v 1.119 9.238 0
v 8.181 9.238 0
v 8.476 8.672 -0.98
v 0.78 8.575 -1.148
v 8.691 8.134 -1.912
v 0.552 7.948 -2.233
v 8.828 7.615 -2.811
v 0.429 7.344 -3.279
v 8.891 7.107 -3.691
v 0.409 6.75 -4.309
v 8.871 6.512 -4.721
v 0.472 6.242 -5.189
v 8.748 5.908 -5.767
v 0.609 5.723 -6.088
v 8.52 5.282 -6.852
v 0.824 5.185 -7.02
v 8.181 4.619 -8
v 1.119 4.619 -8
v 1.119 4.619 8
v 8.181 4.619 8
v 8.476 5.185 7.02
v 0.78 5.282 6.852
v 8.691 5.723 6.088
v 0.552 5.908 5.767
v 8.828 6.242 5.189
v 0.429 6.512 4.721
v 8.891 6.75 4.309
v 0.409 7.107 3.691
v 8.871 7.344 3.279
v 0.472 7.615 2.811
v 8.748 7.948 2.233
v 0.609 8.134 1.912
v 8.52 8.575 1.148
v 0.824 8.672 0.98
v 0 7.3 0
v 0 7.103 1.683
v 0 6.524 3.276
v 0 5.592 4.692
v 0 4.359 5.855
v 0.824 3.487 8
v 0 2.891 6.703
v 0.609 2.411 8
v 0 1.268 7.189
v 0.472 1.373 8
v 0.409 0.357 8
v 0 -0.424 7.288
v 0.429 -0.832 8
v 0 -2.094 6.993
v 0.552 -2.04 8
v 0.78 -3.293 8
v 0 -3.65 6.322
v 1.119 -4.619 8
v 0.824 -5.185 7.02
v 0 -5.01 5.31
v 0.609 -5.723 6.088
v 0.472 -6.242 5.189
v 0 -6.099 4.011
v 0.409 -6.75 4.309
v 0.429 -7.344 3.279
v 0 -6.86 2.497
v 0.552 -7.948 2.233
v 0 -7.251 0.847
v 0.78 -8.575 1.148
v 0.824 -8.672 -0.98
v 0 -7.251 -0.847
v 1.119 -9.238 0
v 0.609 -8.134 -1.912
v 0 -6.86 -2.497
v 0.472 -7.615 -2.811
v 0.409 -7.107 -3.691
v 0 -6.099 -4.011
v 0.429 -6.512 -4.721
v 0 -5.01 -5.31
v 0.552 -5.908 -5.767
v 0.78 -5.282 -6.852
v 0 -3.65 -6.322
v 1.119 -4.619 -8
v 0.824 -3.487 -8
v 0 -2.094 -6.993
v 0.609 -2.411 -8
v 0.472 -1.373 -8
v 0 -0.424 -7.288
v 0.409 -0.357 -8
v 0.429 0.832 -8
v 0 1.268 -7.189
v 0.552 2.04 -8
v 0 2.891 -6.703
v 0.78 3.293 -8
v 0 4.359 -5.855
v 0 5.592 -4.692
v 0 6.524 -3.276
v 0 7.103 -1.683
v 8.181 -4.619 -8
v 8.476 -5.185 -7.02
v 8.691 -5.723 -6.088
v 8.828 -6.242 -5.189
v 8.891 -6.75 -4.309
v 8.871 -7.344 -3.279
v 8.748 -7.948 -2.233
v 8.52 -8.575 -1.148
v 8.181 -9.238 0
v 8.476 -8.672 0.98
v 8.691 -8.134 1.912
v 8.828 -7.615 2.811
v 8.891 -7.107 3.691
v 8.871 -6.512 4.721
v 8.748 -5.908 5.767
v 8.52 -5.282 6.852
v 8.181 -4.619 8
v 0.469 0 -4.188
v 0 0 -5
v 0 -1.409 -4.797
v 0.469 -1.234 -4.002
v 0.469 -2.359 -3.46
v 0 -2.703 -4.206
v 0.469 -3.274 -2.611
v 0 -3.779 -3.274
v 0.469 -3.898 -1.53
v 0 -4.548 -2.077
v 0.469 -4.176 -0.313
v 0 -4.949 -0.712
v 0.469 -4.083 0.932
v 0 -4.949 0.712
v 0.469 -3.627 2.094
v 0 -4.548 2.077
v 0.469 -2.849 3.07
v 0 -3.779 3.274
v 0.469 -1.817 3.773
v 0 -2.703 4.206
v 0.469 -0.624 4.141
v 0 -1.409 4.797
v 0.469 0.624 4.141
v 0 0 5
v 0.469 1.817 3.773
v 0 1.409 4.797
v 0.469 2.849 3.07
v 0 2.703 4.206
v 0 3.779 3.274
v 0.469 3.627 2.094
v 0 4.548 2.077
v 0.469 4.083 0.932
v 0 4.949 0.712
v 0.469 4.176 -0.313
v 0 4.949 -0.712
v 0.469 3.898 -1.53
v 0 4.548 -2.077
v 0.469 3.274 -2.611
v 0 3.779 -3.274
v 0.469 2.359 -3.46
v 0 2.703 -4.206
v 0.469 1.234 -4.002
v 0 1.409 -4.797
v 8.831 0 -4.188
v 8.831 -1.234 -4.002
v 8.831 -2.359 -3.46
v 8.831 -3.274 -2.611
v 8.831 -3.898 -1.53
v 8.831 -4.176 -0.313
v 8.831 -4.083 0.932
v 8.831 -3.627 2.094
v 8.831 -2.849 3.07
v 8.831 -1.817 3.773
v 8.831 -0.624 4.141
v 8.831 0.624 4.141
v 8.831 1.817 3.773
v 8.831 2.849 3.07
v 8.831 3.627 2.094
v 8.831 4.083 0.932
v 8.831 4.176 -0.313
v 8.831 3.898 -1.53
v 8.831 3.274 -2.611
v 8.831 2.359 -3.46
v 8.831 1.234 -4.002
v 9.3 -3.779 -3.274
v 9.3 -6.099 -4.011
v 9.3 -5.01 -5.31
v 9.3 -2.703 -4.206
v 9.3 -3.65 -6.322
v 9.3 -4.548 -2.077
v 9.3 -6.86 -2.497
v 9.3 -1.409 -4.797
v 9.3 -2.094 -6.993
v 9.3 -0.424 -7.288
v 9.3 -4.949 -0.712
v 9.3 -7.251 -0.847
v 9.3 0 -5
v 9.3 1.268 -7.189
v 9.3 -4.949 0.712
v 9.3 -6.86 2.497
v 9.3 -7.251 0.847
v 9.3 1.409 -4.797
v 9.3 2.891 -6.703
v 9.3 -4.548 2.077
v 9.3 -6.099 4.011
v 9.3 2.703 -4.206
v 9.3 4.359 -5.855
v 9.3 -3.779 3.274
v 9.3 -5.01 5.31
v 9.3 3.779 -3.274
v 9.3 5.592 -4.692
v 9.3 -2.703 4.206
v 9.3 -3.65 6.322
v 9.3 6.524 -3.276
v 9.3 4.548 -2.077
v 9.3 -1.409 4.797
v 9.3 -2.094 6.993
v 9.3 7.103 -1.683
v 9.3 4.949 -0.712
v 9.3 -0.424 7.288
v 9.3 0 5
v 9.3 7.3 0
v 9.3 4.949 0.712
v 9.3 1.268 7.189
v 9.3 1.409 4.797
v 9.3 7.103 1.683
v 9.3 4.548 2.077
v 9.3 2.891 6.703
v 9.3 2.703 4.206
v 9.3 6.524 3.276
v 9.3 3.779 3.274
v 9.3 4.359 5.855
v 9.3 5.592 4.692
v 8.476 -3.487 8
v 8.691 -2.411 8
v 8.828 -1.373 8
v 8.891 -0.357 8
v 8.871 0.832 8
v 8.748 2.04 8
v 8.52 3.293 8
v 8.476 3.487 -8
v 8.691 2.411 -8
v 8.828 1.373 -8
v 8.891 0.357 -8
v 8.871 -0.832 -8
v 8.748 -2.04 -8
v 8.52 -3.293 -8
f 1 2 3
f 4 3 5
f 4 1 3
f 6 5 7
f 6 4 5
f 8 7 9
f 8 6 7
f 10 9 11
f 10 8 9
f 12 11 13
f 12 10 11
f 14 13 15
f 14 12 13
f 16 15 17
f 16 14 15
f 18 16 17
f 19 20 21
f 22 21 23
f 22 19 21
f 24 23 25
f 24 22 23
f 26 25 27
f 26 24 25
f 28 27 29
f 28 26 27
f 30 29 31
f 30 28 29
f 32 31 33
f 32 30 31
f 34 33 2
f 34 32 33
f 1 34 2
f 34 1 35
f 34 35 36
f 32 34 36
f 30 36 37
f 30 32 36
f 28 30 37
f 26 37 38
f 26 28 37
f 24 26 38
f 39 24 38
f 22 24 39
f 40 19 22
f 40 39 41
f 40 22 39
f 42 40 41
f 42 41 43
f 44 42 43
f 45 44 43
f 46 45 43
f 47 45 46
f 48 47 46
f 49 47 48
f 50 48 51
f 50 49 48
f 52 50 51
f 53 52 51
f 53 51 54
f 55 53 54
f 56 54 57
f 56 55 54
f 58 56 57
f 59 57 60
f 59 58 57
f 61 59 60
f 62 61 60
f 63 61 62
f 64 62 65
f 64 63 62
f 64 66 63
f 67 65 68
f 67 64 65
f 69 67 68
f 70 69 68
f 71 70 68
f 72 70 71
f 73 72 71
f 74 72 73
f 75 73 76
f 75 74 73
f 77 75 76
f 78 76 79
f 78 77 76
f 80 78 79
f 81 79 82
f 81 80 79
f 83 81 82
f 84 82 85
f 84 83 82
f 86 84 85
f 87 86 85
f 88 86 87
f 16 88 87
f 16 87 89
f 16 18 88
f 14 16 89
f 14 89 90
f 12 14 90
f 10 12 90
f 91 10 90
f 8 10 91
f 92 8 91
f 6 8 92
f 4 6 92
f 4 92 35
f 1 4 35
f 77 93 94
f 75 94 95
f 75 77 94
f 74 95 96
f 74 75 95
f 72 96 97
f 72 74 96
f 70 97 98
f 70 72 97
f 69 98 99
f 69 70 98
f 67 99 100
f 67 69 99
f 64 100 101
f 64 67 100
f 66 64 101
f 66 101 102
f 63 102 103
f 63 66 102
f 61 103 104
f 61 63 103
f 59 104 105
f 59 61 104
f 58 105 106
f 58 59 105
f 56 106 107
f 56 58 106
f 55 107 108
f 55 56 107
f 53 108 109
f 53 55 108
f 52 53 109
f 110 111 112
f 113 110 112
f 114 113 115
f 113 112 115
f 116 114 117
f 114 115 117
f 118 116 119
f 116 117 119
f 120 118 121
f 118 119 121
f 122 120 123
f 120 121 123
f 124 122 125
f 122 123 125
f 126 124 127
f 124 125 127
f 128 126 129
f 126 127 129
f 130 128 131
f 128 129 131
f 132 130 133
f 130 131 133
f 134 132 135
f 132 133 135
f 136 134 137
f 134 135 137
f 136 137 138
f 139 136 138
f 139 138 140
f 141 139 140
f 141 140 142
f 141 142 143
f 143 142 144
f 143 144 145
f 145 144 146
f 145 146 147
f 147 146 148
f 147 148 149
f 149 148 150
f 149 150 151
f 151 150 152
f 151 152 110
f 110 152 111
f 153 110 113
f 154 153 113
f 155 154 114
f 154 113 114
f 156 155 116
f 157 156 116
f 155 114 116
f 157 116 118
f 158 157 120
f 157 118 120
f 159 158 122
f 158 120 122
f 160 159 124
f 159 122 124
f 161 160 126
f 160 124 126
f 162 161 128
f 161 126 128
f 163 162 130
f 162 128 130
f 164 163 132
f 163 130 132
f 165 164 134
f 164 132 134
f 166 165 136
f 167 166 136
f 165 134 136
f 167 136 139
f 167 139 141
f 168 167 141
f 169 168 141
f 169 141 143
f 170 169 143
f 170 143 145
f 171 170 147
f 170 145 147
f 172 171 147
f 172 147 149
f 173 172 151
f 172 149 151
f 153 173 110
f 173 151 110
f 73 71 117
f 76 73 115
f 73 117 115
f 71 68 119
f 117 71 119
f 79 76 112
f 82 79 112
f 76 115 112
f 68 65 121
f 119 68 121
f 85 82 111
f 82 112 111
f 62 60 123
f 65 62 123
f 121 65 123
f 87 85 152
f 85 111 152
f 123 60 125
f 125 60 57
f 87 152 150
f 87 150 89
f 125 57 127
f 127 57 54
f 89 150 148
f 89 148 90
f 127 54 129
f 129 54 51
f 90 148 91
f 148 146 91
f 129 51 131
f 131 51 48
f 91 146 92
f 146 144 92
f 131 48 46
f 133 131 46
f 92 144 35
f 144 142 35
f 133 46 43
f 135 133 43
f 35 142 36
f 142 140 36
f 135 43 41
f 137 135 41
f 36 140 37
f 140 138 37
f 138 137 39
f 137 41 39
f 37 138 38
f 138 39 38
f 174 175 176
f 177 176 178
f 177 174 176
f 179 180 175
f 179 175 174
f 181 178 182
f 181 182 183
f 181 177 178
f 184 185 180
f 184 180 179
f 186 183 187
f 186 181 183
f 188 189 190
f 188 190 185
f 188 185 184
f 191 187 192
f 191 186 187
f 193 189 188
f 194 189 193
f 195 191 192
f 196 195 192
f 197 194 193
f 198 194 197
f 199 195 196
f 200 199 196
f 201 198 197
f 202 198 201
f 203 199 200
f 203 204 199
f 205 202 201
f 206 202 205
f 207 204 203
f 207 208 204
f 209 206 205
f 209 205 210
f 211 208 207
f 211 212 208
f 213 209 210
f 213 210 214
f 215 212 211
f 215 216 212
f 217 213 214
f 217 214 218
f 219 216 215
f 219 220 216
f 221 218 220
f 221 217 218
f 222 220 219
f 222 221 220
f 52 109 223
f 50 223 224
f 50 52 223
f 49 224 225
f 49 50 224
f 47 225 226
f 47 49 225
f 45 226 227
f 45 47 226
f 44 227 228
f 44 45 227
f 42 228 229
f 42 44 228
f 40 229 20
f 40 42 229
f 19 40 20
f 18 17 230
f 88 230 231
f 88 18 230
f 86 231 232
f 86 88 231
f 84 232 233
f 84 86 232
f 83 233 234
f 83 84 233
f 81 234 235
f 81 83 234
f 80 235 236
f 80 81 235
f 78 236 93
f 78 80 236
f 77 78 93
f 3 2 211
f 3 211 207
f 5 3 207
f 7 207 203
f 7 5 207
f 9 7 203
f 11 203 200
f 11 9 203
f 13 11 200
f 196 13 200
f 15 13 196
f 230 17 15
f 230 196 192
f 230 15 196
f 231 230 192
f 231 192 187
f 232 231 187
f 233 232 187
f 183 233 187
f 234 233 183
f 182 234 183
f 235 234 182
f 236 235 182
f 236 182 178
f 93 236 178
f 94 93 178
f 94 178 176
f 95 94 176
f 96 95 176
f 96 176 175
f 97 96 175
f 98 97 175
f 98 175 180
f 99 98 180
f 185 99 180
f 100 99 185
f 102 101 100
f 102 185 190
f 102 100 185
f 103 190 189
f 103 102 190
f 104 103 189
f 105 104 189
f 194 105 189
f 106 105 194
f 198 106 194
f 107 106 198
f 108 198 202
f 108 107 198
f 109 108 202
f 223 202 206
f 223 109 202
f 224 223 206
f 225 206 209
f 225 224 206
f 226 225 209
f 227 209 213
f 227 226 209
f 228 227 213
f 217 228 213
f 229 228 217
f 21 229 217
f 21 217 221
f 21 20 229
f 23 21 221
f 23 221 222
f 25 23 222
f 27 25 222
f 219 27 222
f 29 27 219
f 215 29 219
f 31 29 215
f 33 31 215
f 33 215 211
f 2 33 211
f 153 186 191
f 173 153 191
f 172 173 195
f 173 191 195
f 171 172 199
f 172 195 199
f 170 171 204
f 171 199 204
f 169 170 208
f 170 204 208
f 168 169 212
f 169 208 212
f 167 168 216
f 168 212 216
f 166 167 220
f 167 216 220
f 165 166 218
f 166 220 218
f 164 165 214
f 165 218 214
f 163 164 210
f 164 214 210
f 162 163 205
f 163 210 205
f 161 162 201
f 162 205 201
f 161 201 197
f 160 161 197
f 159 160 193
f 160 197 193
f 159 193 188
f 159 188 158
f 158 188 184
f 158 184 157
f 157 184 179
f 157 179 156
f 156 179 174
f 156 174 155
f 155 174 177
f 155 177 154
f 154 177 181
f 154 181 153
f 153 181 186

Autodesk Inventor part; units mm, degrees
ref_plane "YZ Plane" through (0, 0, 0) normal (1, 0, 0) x (0, 1, 0)
ref_plane "XZ Plane" through (0, 0, 0) normal (0, 1, 0) x (-1, 0, 0)
sketch "Sketch1" plane through (0, 0, 0) normal (1, 0, 0) x (0, 1, 0)
  line L0 (-9.2376, 0) -> (-4.6188, 8)
  line L1 (-4.6188, 8) -> (4.6188, 8)
  line L2 (4.6188, 8) -> (9.2376, 0)
  line L3 (9.2376, 0) -> (4.6188, -8)
  line L4 (4.6188, -8) -> (-4.6188, -8)
  line L5 (-4.6188, -8) -> (-9.2376, 0)
  point P0 (0, 0)
  point P1 (0, 0)
  dimension "d0" = 18.4752
extrude "Body" add sketch "Sketch1" along normal blind 9.3
sketch "Sketch2" plane through (0, 0, 0) normal (0, 0, 1) x (1, 0, 0)
  line L0 (0, 4.6188) -> (0, 9.2376) projected
  line L1 (0, 9.2376) -> (9.3, 9.2376) projected
  line L2 (9.3, 4.6188) -> (9.3, 9.2376) projected
  line L3 (-1.86, 0) -> (11.16, 0) projected
  line L4 (1.1187, 9.2376) -> (0, 7.3)
  line L5 (8.1813, 9.2376) -> (9.3, 7.3)
  dimension "d3" = 30
  dimension "d4" = 30
  dimension "d5" = 14.6
  dimension "d6" = 14.6
revolve "Chamfer1" cut sketch "Sketch2" angle 360 about axis through (-10, 0, 0) along (1, 0, 0)
sketch "Sketch3" plane through (9.3, 0, 0) normal (1, 0, 0) x (0, 0, -1)
  arc A0 (-0.625, -1.0825) -> (0.625, -1.0825) centre (0, 0) ccw projected
hole "Thread" at (9.3, 0, 0) direction (-1, 0, 0) diameter 8.376 end through all thread size "M10x1.5" class "6H" standard "ISO Metric profile"
chamfer "Chamfer2" distance 0.8119 angle 30 1 edges at (9.3, 0, 4.188) measured on face at (9.3, 6.1818, -0.7506)
chamfer "Chamfer3" distance 0.8119 angle 30 1 edges at (0, 0, 4.188) measured on face at (0, 6.1818, -0.7506)
ref_plane "Work Plane1" through (-17.0058, 0, 0) normal (0, -0.866, -0.5) x (1, 0, 0)
equation "\"d0\" = 1.1547 * SW"
equation "\"d1\" = KOH"
equation "\"d8\" = -0.5 * GD1 + 0.5 * NND"
equation "\"d40\" = -0.5 * GD1 + 0.5 * NND"
equation "\"d10\" = -0.5 * GD1 + 0.5 * NND"
equation "\"d41\" = -0.5 * GD1 + 0.5 * NND"
equation "\"d3\" = ANG1"
equation "\"d4\" = ANG2"
equation "\"d5\" = SW0"
equation "\"d6\" = SW01"
equation "\"ANG1\" = 30deg"
equation "\"ANG2\" = 30deg"
equation "\"KOH\" = 9.3"
equation "\"SW\" = 16"
equation "\"SW0\" = 14.6"
equation "\"SW01\" = SW0"
equation "\"GUL\" = 0.541266 * PTC"
equation "\"TOA\" = 30deg"
equation "\"PTC\" = 1.5"
equation "\"E0\" = 1.155 * SW"
equation "\"GAL\" = 0.541266 * PTC"
equation "\"GD1\" = 8.376202"
equation "\"NND\" = 10"
properties part number "ISO 4033 - M10" material "Steel"
